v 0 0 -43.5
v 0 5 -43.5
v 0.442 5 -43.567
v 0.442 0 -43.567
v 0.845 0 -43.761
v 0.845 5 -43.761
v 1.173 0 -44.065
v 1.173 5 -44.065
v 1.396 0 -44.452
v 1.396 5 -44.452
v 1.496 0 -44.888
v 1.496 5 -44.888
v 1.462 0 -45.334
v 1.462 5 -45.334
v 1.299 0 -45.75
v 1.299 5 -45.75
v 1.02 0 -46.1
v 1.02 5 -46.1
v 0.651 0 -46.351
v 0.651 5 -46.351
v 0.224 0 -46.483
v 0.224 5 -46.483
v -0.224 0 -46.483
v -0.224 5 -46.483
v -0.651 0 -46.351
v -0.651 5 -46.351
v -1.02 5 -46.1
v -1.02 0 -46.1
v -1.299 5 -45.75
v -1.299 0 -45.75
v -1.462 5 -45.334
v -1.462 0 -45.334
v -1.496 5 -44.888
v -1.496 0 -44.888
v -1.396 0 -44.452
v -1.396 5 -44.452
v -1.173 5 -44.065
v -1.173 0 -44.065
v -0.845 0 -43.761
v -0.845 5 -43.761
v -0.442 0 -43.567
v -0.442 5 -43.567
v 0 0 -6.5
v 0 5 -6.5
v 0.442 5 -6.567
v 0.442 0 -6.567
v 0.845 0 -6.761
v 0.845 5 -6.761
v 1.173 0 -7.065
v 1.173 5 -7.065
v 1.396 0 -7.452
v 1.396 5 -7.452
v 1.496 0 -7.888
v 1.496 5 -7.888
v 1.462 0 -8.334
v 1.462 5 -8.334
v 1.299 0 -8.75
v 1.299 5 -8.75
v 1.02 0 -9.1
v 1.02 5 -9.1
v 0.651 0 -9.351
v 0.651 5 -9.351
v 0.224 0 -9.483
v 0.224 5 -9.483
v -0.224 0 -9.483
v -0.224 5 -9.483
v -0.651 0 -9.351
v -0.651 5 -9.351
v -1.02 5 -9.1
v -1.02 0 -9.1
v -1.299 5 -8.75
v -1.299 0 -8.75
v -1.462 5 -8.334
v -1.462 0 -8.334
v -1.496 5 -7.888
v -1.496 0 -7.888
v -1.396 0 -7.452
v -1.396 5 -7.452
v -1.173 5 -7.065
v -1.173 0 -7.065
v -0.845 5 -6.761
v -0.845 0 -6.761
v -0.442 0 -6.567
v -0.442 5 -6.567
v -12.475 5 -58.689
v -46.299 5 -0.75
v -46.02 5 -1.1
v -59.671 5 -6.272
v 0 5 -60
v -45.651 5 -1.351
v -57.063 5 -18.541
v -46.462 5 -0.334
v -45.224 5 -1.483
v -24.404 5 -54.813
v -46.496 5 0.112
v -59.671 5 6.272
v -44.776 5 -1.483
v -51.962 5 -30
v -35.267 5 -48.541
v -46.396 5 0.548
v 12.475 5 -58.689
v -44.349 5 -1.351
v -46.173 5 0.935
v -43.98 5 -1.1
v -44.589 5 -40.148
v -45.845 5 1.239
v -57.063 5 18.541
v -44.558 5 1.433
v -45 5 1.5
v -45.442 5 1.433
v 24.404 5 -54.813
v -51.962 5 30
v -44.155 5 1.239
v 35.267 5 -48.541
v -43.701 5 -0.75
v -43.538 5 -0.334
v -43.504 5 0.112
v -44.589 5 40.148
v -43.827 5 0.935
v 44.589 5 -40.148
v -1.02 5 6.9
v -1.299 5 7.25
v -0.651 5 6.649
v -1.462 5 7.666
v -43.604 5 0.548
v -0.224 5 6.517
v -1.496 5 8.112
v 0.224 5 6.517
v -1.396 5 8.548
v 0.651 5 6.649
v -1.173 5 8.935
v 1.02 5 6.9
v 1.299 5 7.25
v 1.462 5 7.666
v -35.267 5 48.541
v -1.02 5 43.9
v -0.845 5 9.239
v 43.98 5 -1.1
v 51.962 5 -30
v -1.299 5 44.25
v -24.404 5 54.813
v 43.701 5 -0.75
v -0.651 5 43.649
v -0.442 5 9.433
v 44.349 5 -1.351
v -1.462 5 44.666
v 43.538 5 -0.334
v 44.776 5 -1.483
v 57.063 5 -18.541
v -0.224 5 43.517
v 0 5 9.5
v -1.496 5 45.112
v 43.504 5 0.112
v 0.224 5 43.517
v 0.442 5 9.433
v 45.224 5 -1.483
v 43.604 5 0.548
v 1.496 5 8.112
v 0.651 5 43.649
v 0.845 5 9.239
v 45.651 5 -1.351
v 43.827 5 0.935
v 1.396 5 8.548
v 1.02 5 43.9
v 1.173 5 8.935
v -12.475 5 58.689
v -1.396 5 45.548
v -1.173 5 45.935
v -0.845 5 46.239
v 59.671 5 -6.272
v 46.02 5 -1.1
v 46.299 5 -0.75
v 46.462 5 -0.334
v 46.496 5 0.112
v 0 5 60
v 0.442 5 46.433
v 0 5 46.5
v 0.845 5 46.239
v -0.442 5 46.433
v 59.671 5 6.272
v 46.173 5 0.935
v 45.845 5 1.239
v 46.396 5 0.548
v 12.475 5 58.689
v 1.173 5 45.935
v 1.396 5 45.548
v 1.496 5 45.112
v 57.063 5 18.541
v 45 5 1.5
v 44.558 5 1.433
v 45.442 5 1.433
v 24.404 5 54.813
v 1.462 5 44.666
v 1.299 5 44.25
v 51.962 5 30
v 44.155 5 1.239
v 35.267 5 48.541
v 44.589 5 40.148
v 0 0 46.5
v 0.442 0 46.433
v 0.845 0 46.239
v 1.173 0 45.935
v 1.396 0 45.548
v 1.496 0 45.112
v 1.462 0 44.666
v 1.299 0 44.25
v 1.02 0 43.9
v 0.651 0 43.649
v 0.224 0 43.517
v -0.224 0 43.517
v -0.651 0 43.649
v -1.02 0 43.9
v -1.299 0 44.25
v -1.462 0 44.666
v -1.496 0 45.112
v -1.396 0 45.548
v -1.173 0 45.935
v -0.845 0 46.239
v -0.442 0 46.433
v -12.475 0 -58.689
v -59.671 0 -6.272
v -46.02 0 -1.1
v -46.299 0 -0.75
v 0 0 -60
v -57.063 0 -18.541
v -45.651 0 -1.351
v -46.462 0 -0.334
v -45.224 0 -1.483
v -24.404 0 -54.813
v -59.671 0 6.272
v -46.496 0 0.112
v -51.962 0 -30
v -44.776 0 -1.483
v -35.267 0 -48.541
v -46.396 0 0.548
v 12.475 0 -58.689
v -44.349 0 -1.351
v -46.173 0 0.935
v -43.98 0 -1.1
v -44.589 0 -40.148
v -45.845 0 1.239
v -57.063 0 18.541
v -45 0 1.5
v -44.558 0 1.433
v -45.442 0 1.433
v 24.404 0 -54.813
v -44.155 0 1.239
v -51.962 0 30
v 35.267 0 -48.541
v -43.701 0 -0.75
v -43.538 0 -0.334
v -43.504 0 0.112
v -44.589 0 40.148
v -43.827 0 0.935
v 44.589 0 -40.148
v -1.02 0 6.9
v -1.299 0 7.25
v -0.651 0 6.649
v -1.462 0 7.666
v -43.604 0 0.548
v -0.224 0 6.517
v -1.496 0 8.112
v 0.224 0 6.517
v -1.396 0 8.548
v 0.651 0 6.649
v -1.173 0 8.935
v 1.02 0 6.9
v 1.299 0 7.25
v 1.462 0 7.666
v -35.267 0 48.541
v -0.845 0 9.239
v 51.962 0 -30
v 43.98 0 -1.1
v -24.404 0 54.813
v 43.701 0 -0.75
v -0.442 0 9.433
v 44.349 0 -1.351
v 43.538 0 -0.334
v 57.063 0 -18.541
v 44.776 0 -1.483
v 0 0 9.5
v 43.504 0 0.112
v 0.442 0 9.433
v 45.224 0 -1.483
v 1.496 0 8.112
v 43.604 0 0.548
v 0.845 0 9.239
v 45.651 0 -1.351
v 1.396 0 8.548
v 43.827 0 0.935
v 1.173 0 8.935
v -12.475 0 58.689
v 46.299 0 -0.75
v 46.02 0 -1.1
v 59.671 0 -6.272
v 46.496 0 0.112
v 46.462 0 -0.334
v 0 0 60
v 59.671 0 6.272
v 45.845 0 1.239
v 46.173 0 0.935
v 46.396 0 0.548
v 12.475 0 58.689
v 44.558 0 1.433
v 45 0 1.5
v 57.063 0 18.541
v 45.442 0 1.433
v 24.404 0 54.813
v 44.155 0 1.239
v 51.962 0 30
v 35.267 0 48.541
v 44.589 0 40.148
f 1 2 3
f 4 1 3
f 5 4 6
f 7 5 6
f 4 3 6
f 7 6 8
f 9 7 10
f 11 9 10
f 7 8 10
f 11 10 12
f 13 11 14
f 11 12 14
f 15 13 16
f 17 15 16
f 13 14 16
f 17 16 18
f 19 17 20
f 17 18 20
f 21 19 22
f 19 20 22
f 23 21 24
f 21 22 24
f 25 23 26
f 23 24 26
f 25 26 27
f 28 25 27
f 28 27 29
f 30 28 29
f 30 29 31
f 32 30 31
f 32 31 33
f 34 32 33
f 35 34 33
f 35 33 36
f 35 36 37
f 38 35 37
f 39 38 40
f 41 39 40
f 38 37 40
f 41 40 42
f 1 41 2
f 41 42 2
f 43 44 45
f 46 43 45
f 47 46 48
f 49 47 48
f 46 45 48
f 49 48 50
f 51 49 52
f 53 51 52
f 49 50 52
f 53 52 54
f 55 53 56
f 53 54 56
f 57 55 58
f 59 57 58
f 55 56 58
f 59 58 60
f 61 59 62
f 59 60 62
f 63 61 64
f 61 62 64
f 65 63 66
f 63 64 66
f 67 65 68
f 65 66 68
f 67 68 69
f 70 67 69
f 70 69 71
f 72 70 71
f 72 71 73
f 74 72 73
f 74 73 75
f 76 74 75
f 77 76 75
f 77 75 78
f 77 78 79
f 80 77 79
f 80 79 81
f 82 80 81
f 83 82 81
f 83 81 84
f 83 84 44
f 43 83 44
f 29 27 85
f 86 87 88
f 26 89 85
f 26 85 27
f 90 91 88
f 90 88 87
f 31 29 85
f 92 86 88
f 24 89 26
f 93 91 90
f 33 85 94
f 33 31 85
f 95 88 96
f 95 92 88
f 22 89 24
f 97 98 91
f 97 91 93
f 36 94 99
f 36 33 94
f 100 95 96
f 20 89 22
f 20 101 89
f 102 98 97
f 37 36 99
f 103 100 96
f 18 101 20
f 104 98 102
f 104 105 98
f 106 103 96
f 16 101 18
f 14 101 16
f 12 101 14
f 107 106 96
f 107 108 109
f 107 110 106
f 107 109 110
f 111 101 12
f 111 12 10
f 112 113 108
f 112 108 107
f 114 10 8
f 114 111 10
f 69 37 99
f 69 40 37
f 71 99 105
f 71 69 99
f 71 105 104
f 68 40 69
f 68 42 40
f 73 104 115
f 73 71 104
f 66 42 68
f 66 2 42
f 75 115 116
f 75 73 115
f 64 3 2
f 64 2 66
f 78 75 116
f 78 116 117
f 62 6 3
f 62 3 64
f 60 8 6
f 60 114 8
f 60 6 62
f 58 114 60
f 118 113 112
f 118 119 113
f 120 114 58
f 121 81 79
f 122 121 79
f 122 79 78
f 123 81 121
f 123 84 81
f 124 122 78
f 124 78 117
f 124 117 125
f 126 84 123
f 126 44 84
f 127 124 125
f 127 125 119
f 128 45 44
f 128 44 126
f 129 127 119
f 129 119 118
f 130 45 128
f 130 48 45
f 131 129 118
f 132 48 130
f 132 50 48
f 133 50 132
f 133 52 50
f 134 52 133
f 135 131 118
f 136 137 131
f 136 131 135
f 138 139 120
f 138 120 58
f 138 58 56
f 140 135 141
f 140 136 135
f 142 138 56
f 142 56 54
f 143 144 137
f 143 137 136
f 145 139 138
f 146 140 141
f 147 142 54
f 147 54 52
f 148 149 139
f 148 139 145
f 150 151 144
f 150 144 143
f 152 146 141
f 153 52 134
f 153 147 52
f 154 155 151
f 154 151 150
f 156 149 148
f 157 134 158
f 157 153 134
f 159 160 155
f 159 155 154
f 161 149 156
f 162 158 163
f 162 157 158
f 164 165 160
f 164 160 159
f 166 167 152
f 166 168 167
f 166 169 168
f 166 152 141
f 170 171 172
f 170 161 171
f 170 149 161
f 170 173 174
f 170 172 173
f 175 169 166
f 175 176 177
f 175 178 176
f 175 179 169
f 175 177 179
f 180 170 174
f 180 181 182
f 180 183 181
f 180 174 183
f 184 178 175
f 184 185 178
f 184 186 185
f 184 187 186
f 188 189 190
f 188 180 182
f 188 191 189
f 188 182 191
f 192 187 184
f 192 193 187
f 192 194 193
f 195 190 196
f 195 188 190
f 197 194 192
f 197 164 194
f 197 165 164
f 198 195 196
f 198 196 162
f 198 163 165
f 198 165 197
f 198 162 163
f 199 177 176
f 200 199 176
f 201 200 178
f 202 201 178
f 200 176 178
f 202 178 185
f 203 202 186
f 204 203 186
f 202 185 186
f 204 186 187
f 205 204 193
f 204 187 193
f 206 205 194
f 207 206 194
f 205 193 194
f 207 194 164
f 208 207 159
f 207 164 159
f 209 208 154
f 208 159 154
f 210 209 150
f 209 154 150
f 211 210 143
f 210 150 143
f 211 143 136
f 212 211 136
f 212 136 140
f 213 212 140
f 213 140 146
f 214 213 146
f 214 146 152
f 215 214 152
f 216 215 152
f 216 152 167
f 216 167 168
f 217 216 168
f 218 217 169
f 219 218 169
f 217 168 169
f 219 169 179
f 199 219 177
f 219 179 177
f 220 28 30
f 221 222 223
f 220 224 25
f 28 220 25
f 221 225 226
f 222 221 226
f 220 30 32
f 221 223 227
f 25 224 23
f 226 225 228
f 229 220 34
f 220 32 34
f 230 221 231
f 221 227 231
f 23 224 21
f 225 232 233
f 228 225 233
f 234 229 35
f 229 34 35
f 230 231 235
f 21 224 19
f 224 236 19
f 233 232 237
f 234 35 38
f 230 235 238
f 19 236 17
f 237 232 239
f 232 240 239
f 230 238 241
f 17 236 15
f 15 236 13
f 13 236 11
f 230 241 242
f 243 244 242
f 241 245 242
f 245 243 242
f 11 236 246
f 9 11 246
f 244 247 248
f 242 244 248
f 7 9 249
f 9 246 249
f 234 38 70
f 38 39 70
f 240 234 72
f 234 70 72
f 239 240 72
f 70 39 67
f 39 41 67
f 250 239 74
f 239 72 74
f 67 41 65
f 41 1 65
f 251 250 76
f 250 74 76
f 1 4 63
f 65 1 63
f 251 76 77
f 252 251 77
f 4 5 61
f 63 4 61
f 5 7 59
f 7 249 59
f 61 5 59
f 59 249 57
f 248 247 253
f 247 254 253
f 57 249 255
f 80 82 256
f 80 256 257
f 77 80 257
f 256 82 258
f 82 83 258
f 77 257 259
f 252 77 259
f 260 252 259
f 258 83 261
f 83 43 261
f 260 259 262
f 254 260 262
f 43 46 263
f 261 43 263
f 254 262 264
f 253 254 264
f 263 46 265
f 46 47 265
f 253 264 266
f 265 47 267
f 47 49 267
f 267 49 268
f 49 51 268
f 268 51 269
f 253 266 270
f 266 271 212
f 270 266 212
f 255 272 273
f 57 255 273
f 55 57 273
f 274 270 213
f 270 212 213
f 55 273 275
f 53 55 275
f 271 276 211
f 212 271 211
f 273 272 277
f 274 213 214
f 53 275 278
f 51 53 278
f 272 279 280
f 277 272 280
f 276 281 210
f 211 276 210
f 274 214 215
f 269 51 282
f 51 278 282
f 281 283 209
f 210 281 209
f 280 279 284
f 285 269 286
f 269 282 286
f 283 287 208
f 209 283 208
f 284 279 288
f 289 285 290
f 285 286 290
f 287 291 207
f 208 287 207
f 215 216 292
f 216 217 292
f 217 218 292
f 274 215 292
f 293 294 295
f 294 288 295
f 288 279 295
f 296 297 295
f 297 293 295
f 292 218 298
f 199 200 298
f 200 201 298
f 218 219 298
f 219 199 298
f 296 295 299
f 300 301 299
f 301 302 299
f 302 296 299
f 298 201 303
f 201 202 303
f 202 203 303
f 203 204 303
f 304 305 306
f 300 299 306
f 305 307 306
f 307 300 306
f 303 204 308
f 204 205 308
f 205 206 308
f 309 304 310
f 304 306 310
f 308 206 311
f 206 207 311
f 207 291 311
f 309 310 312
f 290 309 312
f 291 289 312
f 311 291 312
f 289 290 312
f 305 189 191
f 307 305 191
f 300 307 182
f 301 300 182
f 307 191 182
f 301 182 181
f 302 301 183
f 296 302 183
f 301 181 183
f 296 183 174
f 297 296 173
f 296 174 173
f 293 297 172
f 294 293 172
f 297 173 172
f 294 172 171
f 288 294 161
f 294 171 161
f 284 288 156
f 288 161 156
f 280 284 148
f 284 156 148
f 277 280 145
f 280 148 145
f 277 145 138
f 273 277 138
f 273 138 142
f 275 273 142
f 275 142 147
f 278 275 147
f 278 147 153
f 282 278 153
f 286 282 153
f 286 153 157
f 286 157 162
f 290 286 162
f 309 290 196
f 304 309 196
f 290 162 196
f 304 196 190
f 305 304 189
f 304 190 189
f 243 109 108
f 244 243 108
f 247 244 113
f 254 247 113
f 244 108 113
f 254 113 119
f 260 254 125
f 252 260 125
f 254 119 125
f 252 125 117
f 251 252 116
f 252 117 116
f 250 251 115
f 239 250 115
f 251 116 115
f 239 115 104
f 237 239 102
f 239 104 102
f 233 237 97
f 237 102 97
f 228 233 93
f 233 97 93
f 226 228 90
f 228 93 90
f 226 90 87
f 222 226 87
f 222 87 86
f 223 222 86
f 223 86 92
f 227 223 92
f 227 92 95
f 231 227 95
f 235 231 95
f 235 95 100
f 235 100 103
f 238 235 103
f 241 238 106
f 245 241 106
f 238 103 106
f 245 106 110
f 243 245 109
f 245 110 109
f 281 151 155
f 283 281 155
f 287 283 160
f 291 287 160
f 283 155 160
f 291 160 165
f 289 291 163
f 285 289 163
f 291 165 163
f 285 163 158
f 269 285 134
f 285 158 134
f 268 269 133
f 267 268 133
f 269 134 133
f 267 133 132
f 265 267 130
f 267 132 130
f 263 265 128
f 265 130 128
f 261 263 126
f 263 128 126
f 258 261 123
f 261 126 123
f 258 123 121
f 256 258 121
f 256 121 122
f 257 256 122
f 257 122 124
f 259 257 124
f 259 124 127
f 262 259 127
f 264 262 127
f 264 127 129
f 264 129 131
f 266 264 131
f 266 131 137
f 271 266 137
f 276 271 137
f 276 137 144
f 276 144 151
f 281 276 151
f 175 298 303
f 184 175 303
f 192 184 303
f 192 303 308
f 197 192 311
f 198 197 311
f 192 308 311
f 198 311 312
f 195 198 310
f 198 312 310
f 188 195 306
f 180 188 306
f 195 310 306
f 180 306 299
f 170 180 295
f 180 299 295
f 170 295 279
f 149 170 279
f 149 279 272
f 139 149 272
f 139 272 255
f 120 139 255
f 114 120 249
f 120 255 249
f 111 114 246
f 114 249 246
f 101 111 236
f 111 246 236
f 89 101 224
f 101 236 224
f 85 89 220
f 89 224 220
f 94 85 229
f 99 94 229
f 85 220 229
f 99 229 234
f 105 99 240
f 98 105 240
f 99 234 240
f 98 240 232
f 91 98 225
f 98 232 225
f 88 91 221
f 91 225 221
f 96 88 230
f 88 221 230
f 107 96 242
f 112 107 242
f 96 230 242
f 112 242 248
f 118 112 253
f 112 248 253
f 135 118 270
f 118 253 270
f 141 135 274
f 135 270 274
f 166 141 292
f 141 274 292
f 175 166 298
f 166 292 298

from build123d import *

# Parameters (mm, degrees)
SKETCH1_R           = 60
BOSS_EXTRUDE1_DEPTH = 5
SKETCH2_R           = 1.5
CUT_EXTRUDE1_DEPTH  = 5
CUT_EXTRUDE2_REACH  = 87
SKETCH3_R           = 1.5


with BuildPart() as part:
    # Sketch1 → Boss-Extrude1 (new body)
    with BuildSketch(Plane(origin=(0, 0, 0), x_dir=(1, 0, 0), z_dir=(0, 1, 0))):
        with Locations(Location((0, 0, 0), (0, 0, 270))):
            Circle(SKETCH1_R)
    extrude(amount=BOSS_EXTRUDE1_DEPTH)

    # Sketch2 → Cut-Extrude1 (cut)
    with BuildSketch(Plane(origin=(0, 5, 0), x_dir=(1, 0, 0), z_dir=(0, 1, 0))):
        with Locations(Location((45, 0, 0), (0, 0, 270))):
            Circle(SKETCH2_R)
        with Locations(Location((0, -45, 0), (0, 0, 270))):
            Circle(SKETCH2_R)
        with Locations(Location((-45, 0, 0), (0, 0, 270))):
            Circle(SKETCH2_R)
        with Locations(Location((0, 45, 0), (0, 0, 270))):
            Circle(SKETCH2_R)
    extrude(amount=-CUT_EXTRUDE1_DEPTH, mode=Mode.SUBTRACT)

    # Sketch3 → Cut-Extrude2 (cut, up to next)
    with BuildSketch(Plane(origin=(0, 5, 0), x_dir=(1, 0, 0), z_dir=(0, 1, 0)), mode=Mode.PRIVATE) as cut_extrude2_sk1:
        with Locations(Location((0, -8, 0), (0, 0, 270))):
            Circle(SKETCH3_R)
    cut_extrude2_tool1 = extrude(cut_extrude2_sk1.sketch, amount=-CUT_EXTRUDE2_REACH, mode=Mode.PRIVATE) & part.part
    # Sketch3 → Cut-Extrude2 (cut, up to next)
    with BuildSketch(Plane(origin=(0, 5, 0), x_dir=(1, 0, 0), z_dir=(0, 1, 0)), mode=Mode.PRIVATE) as cut_extrude2_sk2:
        with Locations(Location((0, 8, 0), (0, 0, 270))):
            Circle(SKETCH3_R)
    cut_extrude2_tool2 = extrude(cut_extrude2_sk2.sketch, amount=-CUT_EXTRUDE2_REACH, mode=Mode.PRIVATE) & part.part
    add(cut_extrude2_tool1.solids().sort_by_distance((0, 5, 8))[0], mode=Mode.SUBTRACT)
    add(cut_extrude2_tool2.solids().sort_by_distance((0, 5, -8))[0], mode=Mode.SUBTRACT)


solid = part.part
